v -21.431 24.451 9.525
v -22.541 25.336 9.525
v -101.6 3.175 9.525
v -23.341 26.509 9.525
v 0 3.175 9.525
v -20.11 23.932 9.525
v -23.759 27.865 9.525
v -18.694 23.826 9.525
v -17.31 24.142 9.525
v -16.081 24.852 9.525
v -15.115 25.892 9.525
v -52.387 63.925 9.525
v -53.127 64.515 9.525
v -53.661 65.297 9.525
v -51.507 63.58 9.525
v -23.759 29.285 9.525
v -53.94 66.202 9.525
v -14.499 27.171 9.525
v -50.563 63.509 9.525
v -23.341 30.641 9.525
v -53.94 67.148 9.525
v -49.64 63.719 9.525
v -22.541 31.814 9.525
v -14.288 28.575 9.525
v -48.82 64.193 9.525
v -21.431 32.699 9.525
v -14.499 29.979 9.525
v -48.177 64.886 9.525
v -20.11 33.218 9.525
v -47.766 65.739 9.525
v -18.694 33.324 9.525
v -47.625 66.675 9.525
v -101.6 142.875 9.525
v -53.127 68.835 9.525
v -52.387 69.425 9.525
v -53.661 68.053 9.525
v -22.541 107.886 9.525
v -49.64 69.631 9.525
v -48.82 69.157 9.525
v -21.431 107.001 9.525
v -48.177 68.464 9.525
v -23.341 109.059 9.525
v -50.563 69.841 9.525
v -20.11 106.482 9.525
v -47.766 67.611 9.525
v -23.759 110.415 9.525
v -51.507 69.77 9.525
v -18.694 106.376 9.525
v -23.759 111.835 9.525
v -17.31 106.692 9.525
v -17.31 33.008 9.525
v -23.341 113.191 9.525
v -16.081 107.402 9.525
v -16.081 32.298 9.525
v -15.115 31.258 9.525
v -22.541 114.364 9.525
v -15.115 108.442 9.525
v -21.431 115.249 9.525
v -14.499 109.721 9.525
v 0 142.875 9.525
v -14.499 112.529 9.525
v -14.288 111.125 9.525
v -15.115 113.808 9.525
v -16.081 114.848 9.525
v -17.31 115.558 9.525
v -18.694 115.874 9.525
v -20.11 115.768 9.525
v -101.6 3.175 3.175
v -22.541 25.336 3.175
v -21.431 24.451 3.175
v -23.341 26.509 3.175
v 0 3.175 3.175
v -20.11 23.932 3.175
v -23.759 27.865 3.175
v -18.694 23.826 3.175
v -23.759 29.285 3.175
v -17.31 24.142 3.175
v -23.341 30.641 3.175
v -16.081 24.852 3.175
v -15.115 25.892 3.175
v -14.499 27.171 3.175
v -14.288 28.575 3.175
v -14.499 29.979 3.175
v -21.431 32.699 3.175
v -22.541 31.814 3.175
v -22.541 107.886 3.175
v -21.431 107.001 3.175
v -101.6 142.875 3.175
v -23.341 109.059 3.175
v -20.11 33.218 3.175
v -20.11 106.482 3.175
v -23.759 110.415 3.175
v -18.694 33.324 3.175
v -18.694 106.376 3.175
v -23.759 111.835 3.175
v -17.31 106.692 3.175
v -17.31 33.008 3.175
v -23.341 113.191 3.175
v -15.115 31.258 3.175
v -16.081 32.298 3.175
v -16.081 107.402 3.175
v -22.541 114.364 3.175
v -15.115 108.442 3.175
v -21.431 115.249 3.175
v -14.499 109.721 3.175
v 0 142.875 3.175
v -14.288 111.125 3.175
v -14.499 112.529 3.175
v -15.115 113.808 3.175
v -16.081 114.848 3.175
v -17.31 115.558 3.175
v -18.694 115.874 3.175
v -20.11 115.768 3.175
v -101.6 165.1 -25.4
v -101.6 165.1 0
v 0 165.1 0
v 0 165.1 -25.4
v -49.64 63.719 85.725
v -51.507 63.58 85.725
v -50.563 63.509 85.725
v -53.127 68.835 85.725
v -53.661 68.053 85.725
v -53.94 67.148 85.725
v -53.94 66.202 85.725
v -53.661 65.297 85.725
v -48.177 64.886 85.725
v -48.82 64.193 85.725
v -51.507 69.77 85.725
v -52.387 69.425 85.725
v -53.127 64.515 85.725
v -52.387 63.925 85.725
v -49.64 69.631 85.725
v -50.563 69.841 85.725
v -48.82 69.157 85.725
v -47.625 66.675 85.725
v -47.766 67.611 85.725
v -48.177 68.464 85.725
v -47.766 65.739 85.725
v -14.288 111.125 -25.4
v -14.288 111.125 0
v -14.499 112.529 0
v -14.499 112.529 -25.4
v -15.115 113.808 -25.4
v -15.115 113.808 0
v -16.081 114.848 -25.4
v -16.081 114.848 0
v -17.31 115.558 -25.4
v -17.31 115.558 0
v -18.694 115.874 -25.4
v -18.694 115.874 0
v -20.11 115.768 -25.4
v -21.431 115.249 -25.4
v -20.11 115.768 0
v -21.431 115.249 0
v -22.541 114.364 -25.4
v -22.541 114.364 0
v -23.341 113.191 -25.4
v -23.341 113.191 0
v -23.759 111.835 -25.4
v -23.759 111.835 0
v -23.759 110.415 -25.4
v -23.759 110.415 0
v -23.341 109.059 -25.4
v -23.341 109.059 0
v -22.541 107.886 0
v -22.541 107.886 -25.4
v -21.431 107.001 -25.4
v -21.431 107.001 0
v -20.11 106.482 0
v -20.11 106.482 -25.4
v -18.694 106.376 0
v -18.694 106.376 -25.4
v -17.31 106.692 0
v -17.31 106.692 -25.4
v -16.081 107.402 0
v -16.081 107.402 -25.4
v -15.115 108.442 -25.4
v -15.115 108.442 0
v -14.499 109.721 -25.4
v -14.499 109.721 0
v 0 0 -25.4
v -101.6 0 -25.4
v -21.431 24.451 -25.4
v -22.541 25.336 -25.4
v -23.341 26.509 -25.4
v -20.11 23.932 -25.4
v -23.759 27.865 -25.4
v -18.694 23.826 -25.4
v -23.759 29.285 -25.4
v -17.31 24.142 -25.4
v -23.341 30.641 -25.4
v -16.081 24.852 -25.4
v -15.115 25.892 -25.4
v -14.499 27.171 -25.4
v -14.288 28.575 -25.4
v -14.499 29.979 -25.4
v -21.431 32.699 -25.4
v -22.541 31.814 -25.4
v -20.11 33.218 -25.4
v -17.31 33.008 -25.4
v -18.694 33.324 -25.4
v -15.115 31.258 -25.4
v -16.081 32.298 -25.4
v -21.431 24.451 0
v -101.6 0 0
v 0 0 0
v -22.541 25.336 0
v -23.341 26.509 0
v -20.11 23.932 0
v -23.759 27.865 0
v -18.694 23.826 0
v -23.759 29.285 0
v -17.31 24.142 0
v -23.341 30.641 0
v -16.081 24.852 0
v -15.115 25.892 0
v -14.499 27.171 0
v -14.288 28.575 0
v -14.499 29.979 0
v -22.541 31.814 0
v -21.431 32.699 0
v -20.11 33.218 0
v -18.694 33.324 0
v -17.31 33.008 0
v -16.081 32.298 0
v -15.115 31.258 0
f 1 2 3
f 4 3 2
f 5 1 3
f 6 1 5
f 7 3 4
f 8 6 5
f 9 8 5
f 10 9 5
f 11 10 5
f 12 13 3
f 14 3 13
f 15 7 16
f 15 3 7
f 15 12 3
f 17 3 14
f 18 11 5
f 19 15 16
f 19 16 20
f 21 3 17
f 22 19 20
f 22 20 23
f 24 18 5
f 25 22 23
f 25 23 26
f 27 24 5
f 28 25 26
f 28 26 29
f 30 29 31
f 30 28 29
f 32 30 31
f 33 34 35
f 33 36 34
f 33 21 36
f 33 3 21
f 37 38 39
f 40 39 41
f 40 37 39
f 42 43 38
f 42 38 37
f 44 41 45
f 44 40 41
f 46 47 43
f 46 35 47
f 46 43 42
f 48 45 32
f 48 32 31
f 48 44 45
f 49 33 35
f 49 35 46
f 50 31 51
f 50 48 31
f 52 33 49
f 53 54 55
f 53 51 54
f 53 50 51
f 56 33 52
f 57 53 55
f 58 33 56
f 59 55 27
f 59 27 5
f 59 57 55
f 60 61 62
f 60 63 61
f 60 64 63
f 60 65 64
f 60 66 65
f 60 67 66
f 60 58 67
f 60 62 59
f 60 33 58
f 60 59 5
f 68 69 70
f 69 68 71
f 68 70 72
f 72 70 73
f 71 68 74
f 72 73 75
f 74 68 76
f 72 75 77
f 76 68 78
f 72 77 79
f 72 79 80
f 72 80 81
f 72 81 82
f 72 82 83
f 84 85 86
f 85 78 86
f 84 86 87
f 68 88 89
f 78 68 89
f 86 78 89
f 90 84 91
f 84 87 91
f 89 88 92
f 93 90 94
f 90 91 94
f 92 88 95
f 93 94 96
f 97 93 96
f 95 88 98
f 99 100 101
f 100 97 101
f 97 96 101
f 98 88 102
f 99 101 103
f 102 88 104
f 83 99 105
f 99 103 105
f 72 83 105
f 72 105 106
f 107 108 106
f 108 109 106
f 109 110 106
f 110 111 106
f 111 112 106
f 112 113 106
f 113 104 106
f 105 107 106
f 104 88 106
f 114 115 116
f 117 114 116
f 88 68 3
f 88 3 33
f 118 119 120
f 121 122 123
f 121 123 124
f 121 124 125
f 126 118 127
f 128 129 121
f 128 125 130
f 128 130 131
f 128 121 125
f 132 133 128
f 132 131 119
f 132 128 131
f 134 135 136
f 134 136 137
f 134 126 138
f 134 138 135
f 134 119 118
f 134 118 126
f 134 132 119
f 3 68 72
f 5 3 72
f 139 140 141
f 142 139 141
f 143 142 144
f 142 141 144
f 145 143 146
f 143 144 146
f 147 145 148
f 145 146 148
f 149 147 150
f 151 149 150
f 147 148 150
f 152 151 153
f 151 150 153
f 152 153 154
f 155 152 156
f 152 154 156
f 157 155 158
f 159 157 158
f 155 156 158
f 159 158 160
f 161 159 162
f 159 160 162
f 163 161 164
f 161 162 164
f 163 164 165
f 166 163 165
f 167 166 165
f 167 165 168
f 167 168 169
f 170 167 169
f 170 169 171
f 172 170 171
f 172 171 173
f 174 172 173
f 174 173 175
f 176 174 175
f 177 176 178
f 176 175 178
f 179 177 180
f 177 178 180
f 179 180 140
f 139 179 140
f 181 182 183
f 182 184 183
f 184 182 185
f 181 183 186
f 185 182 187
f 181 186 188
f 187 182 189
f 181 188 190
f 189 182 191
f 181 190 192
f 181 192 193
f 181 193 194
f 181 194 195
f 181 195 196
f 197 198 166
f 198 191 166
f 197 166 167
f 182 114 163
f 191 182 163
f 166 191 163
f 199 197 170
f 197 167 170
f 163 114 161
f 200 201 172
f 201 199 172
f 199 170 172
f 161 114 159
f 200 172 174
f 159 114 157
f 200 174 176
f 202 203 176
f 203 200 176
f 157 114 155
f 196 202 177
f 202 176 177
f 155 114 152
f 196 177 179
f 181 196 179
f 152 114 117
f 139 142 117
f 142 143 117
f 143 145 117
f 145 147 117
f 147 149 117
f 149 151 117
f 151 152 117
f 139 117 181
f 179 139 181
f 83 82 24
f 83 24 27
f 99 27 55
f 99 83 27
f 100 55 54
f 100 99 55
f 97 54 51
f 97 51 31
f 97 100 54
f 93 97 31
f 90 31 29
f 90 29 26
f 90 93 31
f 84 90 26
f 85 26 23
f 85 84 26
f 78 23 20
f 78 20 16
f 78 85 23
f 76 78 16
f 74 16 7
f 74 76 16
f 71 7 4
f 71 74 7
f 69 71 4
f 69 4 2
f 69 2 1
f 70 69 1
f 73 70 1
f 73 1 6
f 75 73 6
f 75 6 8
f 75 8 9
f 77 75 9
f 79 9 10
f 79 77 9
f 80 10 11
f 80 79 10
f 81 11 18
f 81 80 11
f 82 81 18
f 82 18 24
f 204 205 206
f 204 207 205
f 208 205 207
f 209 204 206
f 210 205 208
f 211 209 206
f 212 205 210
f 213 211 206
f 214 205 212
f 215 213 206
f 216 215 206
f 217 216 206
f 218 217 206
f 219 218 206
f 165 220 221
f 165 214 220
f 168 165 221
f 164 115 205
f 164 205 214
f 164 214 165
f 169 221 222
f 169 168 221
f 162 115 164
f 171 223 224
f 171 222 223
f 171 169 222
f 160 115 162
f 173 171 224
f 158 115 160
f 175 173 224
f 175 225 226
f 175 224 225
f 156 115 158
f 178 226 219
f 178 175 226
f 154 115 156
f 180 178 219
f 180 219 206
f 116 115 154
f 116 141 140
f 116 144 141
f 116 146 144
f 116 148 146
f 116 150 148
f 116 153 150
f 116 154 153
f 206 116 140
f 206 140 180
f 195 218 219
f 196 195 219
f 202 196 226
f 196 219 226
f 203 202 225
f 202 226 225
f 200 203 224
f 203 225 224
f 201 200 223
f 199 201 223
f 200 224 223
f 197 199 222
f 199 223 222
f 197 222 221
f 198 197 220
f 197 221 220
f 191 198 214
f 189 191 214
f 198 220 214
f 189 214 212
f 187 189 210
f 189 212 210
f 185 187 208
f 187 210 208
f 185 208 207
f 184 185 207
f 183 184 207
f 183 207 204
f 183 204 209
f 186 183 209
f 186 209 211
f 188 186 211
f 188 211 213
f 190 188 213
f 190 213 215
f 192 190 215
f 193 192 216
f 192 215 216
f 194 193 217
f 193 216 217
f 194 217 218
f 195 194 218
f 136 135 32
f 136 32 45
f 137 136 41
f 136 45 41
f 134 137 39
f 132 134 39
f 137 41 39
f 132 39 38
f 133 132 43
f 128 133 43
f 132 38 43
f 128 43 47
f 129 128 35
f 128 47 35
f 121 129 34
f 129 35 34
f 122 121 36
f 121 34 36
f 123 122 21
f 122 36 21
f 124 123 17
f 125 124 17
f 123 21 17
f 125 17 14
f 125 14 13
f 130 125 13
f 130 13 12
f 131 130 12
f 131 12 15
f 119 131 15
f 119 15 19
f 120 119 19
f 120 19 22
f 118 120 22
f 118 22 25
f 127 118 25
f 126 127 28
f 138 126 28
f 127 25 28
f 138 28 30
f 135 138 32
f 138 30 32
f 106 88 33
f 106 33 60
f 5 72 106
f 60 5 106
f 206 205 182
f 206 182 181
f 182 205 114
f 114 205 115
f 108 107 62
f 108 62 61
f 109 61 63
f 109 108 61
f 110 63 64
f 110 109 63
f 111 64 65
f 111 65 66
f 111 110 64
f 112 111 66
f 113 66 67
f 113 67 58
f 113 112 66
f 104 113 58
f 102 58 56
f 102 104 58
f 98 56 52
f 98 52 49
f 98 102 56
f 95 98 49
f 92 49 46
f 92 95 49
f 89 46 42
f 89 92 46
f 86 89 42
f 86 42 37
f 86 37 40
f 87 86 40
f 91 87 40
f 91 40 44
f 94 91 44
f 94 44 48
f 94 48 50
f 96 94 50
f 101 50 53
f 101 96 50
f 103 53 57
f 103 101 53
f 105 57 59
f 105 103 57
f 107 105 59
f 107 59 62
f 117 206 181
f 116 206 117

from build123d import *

# Parameters (mm, degrees)
F1_W     = 101.6
F1_H     = 165.1
F1_R     = 4.7625
F2_DEPTH = 25.4
F3_W     = 101.6
F3_H     = 139.7
F3_R     = 4.7625
F4_DEPTH = 6.35
F5_R     = 3.175
F6_DEPTH = 76.2


with BuildPart() as f2:
    # F1 (on Top) → F2 (new body)
    with BuildSketch(Plane.XY):
        with Locations((-50.8, 82.55)):
            Rectangle(F1_W, F1_H)
        with Locations((-19.05, 28.575)):
            Circle(F1_R, mode=Mode.SUBTRACT)
        with Locations((-19.05, 111.125)):
            Circle(F1_R, mode=Mode.SUBTRACT)
    extrude(amount=-F2_DEPTH)


with BuildPart() as f4:
    # F3 (on offset) → F4 (new body)
    with BuildSketch(Plane.XY.offset(3.175)):
        with Locations((-50.8, 73.025)):
            Rectangle(F3_W, F3_H)
        with Locations((-19.05, 28.575)):
            Circle(F3_R, mode=Mode.SUBTRACT)
        with Locations((-19.05, 111.125)):
            Circle(F3_R, mode=Mode.SUBTRACT)
    extrude(amount=F4_DEPTH)

    # F5 (on face) → F6 (join)
    with BuildSketch(Plane.XY.offset(9.525)):
        with Locations((-50.8, 66.675)):
            Circle(F5_R)
    extrude(amount=F6_DEPTH)


solid = Compound([f2.part, f4.part])
